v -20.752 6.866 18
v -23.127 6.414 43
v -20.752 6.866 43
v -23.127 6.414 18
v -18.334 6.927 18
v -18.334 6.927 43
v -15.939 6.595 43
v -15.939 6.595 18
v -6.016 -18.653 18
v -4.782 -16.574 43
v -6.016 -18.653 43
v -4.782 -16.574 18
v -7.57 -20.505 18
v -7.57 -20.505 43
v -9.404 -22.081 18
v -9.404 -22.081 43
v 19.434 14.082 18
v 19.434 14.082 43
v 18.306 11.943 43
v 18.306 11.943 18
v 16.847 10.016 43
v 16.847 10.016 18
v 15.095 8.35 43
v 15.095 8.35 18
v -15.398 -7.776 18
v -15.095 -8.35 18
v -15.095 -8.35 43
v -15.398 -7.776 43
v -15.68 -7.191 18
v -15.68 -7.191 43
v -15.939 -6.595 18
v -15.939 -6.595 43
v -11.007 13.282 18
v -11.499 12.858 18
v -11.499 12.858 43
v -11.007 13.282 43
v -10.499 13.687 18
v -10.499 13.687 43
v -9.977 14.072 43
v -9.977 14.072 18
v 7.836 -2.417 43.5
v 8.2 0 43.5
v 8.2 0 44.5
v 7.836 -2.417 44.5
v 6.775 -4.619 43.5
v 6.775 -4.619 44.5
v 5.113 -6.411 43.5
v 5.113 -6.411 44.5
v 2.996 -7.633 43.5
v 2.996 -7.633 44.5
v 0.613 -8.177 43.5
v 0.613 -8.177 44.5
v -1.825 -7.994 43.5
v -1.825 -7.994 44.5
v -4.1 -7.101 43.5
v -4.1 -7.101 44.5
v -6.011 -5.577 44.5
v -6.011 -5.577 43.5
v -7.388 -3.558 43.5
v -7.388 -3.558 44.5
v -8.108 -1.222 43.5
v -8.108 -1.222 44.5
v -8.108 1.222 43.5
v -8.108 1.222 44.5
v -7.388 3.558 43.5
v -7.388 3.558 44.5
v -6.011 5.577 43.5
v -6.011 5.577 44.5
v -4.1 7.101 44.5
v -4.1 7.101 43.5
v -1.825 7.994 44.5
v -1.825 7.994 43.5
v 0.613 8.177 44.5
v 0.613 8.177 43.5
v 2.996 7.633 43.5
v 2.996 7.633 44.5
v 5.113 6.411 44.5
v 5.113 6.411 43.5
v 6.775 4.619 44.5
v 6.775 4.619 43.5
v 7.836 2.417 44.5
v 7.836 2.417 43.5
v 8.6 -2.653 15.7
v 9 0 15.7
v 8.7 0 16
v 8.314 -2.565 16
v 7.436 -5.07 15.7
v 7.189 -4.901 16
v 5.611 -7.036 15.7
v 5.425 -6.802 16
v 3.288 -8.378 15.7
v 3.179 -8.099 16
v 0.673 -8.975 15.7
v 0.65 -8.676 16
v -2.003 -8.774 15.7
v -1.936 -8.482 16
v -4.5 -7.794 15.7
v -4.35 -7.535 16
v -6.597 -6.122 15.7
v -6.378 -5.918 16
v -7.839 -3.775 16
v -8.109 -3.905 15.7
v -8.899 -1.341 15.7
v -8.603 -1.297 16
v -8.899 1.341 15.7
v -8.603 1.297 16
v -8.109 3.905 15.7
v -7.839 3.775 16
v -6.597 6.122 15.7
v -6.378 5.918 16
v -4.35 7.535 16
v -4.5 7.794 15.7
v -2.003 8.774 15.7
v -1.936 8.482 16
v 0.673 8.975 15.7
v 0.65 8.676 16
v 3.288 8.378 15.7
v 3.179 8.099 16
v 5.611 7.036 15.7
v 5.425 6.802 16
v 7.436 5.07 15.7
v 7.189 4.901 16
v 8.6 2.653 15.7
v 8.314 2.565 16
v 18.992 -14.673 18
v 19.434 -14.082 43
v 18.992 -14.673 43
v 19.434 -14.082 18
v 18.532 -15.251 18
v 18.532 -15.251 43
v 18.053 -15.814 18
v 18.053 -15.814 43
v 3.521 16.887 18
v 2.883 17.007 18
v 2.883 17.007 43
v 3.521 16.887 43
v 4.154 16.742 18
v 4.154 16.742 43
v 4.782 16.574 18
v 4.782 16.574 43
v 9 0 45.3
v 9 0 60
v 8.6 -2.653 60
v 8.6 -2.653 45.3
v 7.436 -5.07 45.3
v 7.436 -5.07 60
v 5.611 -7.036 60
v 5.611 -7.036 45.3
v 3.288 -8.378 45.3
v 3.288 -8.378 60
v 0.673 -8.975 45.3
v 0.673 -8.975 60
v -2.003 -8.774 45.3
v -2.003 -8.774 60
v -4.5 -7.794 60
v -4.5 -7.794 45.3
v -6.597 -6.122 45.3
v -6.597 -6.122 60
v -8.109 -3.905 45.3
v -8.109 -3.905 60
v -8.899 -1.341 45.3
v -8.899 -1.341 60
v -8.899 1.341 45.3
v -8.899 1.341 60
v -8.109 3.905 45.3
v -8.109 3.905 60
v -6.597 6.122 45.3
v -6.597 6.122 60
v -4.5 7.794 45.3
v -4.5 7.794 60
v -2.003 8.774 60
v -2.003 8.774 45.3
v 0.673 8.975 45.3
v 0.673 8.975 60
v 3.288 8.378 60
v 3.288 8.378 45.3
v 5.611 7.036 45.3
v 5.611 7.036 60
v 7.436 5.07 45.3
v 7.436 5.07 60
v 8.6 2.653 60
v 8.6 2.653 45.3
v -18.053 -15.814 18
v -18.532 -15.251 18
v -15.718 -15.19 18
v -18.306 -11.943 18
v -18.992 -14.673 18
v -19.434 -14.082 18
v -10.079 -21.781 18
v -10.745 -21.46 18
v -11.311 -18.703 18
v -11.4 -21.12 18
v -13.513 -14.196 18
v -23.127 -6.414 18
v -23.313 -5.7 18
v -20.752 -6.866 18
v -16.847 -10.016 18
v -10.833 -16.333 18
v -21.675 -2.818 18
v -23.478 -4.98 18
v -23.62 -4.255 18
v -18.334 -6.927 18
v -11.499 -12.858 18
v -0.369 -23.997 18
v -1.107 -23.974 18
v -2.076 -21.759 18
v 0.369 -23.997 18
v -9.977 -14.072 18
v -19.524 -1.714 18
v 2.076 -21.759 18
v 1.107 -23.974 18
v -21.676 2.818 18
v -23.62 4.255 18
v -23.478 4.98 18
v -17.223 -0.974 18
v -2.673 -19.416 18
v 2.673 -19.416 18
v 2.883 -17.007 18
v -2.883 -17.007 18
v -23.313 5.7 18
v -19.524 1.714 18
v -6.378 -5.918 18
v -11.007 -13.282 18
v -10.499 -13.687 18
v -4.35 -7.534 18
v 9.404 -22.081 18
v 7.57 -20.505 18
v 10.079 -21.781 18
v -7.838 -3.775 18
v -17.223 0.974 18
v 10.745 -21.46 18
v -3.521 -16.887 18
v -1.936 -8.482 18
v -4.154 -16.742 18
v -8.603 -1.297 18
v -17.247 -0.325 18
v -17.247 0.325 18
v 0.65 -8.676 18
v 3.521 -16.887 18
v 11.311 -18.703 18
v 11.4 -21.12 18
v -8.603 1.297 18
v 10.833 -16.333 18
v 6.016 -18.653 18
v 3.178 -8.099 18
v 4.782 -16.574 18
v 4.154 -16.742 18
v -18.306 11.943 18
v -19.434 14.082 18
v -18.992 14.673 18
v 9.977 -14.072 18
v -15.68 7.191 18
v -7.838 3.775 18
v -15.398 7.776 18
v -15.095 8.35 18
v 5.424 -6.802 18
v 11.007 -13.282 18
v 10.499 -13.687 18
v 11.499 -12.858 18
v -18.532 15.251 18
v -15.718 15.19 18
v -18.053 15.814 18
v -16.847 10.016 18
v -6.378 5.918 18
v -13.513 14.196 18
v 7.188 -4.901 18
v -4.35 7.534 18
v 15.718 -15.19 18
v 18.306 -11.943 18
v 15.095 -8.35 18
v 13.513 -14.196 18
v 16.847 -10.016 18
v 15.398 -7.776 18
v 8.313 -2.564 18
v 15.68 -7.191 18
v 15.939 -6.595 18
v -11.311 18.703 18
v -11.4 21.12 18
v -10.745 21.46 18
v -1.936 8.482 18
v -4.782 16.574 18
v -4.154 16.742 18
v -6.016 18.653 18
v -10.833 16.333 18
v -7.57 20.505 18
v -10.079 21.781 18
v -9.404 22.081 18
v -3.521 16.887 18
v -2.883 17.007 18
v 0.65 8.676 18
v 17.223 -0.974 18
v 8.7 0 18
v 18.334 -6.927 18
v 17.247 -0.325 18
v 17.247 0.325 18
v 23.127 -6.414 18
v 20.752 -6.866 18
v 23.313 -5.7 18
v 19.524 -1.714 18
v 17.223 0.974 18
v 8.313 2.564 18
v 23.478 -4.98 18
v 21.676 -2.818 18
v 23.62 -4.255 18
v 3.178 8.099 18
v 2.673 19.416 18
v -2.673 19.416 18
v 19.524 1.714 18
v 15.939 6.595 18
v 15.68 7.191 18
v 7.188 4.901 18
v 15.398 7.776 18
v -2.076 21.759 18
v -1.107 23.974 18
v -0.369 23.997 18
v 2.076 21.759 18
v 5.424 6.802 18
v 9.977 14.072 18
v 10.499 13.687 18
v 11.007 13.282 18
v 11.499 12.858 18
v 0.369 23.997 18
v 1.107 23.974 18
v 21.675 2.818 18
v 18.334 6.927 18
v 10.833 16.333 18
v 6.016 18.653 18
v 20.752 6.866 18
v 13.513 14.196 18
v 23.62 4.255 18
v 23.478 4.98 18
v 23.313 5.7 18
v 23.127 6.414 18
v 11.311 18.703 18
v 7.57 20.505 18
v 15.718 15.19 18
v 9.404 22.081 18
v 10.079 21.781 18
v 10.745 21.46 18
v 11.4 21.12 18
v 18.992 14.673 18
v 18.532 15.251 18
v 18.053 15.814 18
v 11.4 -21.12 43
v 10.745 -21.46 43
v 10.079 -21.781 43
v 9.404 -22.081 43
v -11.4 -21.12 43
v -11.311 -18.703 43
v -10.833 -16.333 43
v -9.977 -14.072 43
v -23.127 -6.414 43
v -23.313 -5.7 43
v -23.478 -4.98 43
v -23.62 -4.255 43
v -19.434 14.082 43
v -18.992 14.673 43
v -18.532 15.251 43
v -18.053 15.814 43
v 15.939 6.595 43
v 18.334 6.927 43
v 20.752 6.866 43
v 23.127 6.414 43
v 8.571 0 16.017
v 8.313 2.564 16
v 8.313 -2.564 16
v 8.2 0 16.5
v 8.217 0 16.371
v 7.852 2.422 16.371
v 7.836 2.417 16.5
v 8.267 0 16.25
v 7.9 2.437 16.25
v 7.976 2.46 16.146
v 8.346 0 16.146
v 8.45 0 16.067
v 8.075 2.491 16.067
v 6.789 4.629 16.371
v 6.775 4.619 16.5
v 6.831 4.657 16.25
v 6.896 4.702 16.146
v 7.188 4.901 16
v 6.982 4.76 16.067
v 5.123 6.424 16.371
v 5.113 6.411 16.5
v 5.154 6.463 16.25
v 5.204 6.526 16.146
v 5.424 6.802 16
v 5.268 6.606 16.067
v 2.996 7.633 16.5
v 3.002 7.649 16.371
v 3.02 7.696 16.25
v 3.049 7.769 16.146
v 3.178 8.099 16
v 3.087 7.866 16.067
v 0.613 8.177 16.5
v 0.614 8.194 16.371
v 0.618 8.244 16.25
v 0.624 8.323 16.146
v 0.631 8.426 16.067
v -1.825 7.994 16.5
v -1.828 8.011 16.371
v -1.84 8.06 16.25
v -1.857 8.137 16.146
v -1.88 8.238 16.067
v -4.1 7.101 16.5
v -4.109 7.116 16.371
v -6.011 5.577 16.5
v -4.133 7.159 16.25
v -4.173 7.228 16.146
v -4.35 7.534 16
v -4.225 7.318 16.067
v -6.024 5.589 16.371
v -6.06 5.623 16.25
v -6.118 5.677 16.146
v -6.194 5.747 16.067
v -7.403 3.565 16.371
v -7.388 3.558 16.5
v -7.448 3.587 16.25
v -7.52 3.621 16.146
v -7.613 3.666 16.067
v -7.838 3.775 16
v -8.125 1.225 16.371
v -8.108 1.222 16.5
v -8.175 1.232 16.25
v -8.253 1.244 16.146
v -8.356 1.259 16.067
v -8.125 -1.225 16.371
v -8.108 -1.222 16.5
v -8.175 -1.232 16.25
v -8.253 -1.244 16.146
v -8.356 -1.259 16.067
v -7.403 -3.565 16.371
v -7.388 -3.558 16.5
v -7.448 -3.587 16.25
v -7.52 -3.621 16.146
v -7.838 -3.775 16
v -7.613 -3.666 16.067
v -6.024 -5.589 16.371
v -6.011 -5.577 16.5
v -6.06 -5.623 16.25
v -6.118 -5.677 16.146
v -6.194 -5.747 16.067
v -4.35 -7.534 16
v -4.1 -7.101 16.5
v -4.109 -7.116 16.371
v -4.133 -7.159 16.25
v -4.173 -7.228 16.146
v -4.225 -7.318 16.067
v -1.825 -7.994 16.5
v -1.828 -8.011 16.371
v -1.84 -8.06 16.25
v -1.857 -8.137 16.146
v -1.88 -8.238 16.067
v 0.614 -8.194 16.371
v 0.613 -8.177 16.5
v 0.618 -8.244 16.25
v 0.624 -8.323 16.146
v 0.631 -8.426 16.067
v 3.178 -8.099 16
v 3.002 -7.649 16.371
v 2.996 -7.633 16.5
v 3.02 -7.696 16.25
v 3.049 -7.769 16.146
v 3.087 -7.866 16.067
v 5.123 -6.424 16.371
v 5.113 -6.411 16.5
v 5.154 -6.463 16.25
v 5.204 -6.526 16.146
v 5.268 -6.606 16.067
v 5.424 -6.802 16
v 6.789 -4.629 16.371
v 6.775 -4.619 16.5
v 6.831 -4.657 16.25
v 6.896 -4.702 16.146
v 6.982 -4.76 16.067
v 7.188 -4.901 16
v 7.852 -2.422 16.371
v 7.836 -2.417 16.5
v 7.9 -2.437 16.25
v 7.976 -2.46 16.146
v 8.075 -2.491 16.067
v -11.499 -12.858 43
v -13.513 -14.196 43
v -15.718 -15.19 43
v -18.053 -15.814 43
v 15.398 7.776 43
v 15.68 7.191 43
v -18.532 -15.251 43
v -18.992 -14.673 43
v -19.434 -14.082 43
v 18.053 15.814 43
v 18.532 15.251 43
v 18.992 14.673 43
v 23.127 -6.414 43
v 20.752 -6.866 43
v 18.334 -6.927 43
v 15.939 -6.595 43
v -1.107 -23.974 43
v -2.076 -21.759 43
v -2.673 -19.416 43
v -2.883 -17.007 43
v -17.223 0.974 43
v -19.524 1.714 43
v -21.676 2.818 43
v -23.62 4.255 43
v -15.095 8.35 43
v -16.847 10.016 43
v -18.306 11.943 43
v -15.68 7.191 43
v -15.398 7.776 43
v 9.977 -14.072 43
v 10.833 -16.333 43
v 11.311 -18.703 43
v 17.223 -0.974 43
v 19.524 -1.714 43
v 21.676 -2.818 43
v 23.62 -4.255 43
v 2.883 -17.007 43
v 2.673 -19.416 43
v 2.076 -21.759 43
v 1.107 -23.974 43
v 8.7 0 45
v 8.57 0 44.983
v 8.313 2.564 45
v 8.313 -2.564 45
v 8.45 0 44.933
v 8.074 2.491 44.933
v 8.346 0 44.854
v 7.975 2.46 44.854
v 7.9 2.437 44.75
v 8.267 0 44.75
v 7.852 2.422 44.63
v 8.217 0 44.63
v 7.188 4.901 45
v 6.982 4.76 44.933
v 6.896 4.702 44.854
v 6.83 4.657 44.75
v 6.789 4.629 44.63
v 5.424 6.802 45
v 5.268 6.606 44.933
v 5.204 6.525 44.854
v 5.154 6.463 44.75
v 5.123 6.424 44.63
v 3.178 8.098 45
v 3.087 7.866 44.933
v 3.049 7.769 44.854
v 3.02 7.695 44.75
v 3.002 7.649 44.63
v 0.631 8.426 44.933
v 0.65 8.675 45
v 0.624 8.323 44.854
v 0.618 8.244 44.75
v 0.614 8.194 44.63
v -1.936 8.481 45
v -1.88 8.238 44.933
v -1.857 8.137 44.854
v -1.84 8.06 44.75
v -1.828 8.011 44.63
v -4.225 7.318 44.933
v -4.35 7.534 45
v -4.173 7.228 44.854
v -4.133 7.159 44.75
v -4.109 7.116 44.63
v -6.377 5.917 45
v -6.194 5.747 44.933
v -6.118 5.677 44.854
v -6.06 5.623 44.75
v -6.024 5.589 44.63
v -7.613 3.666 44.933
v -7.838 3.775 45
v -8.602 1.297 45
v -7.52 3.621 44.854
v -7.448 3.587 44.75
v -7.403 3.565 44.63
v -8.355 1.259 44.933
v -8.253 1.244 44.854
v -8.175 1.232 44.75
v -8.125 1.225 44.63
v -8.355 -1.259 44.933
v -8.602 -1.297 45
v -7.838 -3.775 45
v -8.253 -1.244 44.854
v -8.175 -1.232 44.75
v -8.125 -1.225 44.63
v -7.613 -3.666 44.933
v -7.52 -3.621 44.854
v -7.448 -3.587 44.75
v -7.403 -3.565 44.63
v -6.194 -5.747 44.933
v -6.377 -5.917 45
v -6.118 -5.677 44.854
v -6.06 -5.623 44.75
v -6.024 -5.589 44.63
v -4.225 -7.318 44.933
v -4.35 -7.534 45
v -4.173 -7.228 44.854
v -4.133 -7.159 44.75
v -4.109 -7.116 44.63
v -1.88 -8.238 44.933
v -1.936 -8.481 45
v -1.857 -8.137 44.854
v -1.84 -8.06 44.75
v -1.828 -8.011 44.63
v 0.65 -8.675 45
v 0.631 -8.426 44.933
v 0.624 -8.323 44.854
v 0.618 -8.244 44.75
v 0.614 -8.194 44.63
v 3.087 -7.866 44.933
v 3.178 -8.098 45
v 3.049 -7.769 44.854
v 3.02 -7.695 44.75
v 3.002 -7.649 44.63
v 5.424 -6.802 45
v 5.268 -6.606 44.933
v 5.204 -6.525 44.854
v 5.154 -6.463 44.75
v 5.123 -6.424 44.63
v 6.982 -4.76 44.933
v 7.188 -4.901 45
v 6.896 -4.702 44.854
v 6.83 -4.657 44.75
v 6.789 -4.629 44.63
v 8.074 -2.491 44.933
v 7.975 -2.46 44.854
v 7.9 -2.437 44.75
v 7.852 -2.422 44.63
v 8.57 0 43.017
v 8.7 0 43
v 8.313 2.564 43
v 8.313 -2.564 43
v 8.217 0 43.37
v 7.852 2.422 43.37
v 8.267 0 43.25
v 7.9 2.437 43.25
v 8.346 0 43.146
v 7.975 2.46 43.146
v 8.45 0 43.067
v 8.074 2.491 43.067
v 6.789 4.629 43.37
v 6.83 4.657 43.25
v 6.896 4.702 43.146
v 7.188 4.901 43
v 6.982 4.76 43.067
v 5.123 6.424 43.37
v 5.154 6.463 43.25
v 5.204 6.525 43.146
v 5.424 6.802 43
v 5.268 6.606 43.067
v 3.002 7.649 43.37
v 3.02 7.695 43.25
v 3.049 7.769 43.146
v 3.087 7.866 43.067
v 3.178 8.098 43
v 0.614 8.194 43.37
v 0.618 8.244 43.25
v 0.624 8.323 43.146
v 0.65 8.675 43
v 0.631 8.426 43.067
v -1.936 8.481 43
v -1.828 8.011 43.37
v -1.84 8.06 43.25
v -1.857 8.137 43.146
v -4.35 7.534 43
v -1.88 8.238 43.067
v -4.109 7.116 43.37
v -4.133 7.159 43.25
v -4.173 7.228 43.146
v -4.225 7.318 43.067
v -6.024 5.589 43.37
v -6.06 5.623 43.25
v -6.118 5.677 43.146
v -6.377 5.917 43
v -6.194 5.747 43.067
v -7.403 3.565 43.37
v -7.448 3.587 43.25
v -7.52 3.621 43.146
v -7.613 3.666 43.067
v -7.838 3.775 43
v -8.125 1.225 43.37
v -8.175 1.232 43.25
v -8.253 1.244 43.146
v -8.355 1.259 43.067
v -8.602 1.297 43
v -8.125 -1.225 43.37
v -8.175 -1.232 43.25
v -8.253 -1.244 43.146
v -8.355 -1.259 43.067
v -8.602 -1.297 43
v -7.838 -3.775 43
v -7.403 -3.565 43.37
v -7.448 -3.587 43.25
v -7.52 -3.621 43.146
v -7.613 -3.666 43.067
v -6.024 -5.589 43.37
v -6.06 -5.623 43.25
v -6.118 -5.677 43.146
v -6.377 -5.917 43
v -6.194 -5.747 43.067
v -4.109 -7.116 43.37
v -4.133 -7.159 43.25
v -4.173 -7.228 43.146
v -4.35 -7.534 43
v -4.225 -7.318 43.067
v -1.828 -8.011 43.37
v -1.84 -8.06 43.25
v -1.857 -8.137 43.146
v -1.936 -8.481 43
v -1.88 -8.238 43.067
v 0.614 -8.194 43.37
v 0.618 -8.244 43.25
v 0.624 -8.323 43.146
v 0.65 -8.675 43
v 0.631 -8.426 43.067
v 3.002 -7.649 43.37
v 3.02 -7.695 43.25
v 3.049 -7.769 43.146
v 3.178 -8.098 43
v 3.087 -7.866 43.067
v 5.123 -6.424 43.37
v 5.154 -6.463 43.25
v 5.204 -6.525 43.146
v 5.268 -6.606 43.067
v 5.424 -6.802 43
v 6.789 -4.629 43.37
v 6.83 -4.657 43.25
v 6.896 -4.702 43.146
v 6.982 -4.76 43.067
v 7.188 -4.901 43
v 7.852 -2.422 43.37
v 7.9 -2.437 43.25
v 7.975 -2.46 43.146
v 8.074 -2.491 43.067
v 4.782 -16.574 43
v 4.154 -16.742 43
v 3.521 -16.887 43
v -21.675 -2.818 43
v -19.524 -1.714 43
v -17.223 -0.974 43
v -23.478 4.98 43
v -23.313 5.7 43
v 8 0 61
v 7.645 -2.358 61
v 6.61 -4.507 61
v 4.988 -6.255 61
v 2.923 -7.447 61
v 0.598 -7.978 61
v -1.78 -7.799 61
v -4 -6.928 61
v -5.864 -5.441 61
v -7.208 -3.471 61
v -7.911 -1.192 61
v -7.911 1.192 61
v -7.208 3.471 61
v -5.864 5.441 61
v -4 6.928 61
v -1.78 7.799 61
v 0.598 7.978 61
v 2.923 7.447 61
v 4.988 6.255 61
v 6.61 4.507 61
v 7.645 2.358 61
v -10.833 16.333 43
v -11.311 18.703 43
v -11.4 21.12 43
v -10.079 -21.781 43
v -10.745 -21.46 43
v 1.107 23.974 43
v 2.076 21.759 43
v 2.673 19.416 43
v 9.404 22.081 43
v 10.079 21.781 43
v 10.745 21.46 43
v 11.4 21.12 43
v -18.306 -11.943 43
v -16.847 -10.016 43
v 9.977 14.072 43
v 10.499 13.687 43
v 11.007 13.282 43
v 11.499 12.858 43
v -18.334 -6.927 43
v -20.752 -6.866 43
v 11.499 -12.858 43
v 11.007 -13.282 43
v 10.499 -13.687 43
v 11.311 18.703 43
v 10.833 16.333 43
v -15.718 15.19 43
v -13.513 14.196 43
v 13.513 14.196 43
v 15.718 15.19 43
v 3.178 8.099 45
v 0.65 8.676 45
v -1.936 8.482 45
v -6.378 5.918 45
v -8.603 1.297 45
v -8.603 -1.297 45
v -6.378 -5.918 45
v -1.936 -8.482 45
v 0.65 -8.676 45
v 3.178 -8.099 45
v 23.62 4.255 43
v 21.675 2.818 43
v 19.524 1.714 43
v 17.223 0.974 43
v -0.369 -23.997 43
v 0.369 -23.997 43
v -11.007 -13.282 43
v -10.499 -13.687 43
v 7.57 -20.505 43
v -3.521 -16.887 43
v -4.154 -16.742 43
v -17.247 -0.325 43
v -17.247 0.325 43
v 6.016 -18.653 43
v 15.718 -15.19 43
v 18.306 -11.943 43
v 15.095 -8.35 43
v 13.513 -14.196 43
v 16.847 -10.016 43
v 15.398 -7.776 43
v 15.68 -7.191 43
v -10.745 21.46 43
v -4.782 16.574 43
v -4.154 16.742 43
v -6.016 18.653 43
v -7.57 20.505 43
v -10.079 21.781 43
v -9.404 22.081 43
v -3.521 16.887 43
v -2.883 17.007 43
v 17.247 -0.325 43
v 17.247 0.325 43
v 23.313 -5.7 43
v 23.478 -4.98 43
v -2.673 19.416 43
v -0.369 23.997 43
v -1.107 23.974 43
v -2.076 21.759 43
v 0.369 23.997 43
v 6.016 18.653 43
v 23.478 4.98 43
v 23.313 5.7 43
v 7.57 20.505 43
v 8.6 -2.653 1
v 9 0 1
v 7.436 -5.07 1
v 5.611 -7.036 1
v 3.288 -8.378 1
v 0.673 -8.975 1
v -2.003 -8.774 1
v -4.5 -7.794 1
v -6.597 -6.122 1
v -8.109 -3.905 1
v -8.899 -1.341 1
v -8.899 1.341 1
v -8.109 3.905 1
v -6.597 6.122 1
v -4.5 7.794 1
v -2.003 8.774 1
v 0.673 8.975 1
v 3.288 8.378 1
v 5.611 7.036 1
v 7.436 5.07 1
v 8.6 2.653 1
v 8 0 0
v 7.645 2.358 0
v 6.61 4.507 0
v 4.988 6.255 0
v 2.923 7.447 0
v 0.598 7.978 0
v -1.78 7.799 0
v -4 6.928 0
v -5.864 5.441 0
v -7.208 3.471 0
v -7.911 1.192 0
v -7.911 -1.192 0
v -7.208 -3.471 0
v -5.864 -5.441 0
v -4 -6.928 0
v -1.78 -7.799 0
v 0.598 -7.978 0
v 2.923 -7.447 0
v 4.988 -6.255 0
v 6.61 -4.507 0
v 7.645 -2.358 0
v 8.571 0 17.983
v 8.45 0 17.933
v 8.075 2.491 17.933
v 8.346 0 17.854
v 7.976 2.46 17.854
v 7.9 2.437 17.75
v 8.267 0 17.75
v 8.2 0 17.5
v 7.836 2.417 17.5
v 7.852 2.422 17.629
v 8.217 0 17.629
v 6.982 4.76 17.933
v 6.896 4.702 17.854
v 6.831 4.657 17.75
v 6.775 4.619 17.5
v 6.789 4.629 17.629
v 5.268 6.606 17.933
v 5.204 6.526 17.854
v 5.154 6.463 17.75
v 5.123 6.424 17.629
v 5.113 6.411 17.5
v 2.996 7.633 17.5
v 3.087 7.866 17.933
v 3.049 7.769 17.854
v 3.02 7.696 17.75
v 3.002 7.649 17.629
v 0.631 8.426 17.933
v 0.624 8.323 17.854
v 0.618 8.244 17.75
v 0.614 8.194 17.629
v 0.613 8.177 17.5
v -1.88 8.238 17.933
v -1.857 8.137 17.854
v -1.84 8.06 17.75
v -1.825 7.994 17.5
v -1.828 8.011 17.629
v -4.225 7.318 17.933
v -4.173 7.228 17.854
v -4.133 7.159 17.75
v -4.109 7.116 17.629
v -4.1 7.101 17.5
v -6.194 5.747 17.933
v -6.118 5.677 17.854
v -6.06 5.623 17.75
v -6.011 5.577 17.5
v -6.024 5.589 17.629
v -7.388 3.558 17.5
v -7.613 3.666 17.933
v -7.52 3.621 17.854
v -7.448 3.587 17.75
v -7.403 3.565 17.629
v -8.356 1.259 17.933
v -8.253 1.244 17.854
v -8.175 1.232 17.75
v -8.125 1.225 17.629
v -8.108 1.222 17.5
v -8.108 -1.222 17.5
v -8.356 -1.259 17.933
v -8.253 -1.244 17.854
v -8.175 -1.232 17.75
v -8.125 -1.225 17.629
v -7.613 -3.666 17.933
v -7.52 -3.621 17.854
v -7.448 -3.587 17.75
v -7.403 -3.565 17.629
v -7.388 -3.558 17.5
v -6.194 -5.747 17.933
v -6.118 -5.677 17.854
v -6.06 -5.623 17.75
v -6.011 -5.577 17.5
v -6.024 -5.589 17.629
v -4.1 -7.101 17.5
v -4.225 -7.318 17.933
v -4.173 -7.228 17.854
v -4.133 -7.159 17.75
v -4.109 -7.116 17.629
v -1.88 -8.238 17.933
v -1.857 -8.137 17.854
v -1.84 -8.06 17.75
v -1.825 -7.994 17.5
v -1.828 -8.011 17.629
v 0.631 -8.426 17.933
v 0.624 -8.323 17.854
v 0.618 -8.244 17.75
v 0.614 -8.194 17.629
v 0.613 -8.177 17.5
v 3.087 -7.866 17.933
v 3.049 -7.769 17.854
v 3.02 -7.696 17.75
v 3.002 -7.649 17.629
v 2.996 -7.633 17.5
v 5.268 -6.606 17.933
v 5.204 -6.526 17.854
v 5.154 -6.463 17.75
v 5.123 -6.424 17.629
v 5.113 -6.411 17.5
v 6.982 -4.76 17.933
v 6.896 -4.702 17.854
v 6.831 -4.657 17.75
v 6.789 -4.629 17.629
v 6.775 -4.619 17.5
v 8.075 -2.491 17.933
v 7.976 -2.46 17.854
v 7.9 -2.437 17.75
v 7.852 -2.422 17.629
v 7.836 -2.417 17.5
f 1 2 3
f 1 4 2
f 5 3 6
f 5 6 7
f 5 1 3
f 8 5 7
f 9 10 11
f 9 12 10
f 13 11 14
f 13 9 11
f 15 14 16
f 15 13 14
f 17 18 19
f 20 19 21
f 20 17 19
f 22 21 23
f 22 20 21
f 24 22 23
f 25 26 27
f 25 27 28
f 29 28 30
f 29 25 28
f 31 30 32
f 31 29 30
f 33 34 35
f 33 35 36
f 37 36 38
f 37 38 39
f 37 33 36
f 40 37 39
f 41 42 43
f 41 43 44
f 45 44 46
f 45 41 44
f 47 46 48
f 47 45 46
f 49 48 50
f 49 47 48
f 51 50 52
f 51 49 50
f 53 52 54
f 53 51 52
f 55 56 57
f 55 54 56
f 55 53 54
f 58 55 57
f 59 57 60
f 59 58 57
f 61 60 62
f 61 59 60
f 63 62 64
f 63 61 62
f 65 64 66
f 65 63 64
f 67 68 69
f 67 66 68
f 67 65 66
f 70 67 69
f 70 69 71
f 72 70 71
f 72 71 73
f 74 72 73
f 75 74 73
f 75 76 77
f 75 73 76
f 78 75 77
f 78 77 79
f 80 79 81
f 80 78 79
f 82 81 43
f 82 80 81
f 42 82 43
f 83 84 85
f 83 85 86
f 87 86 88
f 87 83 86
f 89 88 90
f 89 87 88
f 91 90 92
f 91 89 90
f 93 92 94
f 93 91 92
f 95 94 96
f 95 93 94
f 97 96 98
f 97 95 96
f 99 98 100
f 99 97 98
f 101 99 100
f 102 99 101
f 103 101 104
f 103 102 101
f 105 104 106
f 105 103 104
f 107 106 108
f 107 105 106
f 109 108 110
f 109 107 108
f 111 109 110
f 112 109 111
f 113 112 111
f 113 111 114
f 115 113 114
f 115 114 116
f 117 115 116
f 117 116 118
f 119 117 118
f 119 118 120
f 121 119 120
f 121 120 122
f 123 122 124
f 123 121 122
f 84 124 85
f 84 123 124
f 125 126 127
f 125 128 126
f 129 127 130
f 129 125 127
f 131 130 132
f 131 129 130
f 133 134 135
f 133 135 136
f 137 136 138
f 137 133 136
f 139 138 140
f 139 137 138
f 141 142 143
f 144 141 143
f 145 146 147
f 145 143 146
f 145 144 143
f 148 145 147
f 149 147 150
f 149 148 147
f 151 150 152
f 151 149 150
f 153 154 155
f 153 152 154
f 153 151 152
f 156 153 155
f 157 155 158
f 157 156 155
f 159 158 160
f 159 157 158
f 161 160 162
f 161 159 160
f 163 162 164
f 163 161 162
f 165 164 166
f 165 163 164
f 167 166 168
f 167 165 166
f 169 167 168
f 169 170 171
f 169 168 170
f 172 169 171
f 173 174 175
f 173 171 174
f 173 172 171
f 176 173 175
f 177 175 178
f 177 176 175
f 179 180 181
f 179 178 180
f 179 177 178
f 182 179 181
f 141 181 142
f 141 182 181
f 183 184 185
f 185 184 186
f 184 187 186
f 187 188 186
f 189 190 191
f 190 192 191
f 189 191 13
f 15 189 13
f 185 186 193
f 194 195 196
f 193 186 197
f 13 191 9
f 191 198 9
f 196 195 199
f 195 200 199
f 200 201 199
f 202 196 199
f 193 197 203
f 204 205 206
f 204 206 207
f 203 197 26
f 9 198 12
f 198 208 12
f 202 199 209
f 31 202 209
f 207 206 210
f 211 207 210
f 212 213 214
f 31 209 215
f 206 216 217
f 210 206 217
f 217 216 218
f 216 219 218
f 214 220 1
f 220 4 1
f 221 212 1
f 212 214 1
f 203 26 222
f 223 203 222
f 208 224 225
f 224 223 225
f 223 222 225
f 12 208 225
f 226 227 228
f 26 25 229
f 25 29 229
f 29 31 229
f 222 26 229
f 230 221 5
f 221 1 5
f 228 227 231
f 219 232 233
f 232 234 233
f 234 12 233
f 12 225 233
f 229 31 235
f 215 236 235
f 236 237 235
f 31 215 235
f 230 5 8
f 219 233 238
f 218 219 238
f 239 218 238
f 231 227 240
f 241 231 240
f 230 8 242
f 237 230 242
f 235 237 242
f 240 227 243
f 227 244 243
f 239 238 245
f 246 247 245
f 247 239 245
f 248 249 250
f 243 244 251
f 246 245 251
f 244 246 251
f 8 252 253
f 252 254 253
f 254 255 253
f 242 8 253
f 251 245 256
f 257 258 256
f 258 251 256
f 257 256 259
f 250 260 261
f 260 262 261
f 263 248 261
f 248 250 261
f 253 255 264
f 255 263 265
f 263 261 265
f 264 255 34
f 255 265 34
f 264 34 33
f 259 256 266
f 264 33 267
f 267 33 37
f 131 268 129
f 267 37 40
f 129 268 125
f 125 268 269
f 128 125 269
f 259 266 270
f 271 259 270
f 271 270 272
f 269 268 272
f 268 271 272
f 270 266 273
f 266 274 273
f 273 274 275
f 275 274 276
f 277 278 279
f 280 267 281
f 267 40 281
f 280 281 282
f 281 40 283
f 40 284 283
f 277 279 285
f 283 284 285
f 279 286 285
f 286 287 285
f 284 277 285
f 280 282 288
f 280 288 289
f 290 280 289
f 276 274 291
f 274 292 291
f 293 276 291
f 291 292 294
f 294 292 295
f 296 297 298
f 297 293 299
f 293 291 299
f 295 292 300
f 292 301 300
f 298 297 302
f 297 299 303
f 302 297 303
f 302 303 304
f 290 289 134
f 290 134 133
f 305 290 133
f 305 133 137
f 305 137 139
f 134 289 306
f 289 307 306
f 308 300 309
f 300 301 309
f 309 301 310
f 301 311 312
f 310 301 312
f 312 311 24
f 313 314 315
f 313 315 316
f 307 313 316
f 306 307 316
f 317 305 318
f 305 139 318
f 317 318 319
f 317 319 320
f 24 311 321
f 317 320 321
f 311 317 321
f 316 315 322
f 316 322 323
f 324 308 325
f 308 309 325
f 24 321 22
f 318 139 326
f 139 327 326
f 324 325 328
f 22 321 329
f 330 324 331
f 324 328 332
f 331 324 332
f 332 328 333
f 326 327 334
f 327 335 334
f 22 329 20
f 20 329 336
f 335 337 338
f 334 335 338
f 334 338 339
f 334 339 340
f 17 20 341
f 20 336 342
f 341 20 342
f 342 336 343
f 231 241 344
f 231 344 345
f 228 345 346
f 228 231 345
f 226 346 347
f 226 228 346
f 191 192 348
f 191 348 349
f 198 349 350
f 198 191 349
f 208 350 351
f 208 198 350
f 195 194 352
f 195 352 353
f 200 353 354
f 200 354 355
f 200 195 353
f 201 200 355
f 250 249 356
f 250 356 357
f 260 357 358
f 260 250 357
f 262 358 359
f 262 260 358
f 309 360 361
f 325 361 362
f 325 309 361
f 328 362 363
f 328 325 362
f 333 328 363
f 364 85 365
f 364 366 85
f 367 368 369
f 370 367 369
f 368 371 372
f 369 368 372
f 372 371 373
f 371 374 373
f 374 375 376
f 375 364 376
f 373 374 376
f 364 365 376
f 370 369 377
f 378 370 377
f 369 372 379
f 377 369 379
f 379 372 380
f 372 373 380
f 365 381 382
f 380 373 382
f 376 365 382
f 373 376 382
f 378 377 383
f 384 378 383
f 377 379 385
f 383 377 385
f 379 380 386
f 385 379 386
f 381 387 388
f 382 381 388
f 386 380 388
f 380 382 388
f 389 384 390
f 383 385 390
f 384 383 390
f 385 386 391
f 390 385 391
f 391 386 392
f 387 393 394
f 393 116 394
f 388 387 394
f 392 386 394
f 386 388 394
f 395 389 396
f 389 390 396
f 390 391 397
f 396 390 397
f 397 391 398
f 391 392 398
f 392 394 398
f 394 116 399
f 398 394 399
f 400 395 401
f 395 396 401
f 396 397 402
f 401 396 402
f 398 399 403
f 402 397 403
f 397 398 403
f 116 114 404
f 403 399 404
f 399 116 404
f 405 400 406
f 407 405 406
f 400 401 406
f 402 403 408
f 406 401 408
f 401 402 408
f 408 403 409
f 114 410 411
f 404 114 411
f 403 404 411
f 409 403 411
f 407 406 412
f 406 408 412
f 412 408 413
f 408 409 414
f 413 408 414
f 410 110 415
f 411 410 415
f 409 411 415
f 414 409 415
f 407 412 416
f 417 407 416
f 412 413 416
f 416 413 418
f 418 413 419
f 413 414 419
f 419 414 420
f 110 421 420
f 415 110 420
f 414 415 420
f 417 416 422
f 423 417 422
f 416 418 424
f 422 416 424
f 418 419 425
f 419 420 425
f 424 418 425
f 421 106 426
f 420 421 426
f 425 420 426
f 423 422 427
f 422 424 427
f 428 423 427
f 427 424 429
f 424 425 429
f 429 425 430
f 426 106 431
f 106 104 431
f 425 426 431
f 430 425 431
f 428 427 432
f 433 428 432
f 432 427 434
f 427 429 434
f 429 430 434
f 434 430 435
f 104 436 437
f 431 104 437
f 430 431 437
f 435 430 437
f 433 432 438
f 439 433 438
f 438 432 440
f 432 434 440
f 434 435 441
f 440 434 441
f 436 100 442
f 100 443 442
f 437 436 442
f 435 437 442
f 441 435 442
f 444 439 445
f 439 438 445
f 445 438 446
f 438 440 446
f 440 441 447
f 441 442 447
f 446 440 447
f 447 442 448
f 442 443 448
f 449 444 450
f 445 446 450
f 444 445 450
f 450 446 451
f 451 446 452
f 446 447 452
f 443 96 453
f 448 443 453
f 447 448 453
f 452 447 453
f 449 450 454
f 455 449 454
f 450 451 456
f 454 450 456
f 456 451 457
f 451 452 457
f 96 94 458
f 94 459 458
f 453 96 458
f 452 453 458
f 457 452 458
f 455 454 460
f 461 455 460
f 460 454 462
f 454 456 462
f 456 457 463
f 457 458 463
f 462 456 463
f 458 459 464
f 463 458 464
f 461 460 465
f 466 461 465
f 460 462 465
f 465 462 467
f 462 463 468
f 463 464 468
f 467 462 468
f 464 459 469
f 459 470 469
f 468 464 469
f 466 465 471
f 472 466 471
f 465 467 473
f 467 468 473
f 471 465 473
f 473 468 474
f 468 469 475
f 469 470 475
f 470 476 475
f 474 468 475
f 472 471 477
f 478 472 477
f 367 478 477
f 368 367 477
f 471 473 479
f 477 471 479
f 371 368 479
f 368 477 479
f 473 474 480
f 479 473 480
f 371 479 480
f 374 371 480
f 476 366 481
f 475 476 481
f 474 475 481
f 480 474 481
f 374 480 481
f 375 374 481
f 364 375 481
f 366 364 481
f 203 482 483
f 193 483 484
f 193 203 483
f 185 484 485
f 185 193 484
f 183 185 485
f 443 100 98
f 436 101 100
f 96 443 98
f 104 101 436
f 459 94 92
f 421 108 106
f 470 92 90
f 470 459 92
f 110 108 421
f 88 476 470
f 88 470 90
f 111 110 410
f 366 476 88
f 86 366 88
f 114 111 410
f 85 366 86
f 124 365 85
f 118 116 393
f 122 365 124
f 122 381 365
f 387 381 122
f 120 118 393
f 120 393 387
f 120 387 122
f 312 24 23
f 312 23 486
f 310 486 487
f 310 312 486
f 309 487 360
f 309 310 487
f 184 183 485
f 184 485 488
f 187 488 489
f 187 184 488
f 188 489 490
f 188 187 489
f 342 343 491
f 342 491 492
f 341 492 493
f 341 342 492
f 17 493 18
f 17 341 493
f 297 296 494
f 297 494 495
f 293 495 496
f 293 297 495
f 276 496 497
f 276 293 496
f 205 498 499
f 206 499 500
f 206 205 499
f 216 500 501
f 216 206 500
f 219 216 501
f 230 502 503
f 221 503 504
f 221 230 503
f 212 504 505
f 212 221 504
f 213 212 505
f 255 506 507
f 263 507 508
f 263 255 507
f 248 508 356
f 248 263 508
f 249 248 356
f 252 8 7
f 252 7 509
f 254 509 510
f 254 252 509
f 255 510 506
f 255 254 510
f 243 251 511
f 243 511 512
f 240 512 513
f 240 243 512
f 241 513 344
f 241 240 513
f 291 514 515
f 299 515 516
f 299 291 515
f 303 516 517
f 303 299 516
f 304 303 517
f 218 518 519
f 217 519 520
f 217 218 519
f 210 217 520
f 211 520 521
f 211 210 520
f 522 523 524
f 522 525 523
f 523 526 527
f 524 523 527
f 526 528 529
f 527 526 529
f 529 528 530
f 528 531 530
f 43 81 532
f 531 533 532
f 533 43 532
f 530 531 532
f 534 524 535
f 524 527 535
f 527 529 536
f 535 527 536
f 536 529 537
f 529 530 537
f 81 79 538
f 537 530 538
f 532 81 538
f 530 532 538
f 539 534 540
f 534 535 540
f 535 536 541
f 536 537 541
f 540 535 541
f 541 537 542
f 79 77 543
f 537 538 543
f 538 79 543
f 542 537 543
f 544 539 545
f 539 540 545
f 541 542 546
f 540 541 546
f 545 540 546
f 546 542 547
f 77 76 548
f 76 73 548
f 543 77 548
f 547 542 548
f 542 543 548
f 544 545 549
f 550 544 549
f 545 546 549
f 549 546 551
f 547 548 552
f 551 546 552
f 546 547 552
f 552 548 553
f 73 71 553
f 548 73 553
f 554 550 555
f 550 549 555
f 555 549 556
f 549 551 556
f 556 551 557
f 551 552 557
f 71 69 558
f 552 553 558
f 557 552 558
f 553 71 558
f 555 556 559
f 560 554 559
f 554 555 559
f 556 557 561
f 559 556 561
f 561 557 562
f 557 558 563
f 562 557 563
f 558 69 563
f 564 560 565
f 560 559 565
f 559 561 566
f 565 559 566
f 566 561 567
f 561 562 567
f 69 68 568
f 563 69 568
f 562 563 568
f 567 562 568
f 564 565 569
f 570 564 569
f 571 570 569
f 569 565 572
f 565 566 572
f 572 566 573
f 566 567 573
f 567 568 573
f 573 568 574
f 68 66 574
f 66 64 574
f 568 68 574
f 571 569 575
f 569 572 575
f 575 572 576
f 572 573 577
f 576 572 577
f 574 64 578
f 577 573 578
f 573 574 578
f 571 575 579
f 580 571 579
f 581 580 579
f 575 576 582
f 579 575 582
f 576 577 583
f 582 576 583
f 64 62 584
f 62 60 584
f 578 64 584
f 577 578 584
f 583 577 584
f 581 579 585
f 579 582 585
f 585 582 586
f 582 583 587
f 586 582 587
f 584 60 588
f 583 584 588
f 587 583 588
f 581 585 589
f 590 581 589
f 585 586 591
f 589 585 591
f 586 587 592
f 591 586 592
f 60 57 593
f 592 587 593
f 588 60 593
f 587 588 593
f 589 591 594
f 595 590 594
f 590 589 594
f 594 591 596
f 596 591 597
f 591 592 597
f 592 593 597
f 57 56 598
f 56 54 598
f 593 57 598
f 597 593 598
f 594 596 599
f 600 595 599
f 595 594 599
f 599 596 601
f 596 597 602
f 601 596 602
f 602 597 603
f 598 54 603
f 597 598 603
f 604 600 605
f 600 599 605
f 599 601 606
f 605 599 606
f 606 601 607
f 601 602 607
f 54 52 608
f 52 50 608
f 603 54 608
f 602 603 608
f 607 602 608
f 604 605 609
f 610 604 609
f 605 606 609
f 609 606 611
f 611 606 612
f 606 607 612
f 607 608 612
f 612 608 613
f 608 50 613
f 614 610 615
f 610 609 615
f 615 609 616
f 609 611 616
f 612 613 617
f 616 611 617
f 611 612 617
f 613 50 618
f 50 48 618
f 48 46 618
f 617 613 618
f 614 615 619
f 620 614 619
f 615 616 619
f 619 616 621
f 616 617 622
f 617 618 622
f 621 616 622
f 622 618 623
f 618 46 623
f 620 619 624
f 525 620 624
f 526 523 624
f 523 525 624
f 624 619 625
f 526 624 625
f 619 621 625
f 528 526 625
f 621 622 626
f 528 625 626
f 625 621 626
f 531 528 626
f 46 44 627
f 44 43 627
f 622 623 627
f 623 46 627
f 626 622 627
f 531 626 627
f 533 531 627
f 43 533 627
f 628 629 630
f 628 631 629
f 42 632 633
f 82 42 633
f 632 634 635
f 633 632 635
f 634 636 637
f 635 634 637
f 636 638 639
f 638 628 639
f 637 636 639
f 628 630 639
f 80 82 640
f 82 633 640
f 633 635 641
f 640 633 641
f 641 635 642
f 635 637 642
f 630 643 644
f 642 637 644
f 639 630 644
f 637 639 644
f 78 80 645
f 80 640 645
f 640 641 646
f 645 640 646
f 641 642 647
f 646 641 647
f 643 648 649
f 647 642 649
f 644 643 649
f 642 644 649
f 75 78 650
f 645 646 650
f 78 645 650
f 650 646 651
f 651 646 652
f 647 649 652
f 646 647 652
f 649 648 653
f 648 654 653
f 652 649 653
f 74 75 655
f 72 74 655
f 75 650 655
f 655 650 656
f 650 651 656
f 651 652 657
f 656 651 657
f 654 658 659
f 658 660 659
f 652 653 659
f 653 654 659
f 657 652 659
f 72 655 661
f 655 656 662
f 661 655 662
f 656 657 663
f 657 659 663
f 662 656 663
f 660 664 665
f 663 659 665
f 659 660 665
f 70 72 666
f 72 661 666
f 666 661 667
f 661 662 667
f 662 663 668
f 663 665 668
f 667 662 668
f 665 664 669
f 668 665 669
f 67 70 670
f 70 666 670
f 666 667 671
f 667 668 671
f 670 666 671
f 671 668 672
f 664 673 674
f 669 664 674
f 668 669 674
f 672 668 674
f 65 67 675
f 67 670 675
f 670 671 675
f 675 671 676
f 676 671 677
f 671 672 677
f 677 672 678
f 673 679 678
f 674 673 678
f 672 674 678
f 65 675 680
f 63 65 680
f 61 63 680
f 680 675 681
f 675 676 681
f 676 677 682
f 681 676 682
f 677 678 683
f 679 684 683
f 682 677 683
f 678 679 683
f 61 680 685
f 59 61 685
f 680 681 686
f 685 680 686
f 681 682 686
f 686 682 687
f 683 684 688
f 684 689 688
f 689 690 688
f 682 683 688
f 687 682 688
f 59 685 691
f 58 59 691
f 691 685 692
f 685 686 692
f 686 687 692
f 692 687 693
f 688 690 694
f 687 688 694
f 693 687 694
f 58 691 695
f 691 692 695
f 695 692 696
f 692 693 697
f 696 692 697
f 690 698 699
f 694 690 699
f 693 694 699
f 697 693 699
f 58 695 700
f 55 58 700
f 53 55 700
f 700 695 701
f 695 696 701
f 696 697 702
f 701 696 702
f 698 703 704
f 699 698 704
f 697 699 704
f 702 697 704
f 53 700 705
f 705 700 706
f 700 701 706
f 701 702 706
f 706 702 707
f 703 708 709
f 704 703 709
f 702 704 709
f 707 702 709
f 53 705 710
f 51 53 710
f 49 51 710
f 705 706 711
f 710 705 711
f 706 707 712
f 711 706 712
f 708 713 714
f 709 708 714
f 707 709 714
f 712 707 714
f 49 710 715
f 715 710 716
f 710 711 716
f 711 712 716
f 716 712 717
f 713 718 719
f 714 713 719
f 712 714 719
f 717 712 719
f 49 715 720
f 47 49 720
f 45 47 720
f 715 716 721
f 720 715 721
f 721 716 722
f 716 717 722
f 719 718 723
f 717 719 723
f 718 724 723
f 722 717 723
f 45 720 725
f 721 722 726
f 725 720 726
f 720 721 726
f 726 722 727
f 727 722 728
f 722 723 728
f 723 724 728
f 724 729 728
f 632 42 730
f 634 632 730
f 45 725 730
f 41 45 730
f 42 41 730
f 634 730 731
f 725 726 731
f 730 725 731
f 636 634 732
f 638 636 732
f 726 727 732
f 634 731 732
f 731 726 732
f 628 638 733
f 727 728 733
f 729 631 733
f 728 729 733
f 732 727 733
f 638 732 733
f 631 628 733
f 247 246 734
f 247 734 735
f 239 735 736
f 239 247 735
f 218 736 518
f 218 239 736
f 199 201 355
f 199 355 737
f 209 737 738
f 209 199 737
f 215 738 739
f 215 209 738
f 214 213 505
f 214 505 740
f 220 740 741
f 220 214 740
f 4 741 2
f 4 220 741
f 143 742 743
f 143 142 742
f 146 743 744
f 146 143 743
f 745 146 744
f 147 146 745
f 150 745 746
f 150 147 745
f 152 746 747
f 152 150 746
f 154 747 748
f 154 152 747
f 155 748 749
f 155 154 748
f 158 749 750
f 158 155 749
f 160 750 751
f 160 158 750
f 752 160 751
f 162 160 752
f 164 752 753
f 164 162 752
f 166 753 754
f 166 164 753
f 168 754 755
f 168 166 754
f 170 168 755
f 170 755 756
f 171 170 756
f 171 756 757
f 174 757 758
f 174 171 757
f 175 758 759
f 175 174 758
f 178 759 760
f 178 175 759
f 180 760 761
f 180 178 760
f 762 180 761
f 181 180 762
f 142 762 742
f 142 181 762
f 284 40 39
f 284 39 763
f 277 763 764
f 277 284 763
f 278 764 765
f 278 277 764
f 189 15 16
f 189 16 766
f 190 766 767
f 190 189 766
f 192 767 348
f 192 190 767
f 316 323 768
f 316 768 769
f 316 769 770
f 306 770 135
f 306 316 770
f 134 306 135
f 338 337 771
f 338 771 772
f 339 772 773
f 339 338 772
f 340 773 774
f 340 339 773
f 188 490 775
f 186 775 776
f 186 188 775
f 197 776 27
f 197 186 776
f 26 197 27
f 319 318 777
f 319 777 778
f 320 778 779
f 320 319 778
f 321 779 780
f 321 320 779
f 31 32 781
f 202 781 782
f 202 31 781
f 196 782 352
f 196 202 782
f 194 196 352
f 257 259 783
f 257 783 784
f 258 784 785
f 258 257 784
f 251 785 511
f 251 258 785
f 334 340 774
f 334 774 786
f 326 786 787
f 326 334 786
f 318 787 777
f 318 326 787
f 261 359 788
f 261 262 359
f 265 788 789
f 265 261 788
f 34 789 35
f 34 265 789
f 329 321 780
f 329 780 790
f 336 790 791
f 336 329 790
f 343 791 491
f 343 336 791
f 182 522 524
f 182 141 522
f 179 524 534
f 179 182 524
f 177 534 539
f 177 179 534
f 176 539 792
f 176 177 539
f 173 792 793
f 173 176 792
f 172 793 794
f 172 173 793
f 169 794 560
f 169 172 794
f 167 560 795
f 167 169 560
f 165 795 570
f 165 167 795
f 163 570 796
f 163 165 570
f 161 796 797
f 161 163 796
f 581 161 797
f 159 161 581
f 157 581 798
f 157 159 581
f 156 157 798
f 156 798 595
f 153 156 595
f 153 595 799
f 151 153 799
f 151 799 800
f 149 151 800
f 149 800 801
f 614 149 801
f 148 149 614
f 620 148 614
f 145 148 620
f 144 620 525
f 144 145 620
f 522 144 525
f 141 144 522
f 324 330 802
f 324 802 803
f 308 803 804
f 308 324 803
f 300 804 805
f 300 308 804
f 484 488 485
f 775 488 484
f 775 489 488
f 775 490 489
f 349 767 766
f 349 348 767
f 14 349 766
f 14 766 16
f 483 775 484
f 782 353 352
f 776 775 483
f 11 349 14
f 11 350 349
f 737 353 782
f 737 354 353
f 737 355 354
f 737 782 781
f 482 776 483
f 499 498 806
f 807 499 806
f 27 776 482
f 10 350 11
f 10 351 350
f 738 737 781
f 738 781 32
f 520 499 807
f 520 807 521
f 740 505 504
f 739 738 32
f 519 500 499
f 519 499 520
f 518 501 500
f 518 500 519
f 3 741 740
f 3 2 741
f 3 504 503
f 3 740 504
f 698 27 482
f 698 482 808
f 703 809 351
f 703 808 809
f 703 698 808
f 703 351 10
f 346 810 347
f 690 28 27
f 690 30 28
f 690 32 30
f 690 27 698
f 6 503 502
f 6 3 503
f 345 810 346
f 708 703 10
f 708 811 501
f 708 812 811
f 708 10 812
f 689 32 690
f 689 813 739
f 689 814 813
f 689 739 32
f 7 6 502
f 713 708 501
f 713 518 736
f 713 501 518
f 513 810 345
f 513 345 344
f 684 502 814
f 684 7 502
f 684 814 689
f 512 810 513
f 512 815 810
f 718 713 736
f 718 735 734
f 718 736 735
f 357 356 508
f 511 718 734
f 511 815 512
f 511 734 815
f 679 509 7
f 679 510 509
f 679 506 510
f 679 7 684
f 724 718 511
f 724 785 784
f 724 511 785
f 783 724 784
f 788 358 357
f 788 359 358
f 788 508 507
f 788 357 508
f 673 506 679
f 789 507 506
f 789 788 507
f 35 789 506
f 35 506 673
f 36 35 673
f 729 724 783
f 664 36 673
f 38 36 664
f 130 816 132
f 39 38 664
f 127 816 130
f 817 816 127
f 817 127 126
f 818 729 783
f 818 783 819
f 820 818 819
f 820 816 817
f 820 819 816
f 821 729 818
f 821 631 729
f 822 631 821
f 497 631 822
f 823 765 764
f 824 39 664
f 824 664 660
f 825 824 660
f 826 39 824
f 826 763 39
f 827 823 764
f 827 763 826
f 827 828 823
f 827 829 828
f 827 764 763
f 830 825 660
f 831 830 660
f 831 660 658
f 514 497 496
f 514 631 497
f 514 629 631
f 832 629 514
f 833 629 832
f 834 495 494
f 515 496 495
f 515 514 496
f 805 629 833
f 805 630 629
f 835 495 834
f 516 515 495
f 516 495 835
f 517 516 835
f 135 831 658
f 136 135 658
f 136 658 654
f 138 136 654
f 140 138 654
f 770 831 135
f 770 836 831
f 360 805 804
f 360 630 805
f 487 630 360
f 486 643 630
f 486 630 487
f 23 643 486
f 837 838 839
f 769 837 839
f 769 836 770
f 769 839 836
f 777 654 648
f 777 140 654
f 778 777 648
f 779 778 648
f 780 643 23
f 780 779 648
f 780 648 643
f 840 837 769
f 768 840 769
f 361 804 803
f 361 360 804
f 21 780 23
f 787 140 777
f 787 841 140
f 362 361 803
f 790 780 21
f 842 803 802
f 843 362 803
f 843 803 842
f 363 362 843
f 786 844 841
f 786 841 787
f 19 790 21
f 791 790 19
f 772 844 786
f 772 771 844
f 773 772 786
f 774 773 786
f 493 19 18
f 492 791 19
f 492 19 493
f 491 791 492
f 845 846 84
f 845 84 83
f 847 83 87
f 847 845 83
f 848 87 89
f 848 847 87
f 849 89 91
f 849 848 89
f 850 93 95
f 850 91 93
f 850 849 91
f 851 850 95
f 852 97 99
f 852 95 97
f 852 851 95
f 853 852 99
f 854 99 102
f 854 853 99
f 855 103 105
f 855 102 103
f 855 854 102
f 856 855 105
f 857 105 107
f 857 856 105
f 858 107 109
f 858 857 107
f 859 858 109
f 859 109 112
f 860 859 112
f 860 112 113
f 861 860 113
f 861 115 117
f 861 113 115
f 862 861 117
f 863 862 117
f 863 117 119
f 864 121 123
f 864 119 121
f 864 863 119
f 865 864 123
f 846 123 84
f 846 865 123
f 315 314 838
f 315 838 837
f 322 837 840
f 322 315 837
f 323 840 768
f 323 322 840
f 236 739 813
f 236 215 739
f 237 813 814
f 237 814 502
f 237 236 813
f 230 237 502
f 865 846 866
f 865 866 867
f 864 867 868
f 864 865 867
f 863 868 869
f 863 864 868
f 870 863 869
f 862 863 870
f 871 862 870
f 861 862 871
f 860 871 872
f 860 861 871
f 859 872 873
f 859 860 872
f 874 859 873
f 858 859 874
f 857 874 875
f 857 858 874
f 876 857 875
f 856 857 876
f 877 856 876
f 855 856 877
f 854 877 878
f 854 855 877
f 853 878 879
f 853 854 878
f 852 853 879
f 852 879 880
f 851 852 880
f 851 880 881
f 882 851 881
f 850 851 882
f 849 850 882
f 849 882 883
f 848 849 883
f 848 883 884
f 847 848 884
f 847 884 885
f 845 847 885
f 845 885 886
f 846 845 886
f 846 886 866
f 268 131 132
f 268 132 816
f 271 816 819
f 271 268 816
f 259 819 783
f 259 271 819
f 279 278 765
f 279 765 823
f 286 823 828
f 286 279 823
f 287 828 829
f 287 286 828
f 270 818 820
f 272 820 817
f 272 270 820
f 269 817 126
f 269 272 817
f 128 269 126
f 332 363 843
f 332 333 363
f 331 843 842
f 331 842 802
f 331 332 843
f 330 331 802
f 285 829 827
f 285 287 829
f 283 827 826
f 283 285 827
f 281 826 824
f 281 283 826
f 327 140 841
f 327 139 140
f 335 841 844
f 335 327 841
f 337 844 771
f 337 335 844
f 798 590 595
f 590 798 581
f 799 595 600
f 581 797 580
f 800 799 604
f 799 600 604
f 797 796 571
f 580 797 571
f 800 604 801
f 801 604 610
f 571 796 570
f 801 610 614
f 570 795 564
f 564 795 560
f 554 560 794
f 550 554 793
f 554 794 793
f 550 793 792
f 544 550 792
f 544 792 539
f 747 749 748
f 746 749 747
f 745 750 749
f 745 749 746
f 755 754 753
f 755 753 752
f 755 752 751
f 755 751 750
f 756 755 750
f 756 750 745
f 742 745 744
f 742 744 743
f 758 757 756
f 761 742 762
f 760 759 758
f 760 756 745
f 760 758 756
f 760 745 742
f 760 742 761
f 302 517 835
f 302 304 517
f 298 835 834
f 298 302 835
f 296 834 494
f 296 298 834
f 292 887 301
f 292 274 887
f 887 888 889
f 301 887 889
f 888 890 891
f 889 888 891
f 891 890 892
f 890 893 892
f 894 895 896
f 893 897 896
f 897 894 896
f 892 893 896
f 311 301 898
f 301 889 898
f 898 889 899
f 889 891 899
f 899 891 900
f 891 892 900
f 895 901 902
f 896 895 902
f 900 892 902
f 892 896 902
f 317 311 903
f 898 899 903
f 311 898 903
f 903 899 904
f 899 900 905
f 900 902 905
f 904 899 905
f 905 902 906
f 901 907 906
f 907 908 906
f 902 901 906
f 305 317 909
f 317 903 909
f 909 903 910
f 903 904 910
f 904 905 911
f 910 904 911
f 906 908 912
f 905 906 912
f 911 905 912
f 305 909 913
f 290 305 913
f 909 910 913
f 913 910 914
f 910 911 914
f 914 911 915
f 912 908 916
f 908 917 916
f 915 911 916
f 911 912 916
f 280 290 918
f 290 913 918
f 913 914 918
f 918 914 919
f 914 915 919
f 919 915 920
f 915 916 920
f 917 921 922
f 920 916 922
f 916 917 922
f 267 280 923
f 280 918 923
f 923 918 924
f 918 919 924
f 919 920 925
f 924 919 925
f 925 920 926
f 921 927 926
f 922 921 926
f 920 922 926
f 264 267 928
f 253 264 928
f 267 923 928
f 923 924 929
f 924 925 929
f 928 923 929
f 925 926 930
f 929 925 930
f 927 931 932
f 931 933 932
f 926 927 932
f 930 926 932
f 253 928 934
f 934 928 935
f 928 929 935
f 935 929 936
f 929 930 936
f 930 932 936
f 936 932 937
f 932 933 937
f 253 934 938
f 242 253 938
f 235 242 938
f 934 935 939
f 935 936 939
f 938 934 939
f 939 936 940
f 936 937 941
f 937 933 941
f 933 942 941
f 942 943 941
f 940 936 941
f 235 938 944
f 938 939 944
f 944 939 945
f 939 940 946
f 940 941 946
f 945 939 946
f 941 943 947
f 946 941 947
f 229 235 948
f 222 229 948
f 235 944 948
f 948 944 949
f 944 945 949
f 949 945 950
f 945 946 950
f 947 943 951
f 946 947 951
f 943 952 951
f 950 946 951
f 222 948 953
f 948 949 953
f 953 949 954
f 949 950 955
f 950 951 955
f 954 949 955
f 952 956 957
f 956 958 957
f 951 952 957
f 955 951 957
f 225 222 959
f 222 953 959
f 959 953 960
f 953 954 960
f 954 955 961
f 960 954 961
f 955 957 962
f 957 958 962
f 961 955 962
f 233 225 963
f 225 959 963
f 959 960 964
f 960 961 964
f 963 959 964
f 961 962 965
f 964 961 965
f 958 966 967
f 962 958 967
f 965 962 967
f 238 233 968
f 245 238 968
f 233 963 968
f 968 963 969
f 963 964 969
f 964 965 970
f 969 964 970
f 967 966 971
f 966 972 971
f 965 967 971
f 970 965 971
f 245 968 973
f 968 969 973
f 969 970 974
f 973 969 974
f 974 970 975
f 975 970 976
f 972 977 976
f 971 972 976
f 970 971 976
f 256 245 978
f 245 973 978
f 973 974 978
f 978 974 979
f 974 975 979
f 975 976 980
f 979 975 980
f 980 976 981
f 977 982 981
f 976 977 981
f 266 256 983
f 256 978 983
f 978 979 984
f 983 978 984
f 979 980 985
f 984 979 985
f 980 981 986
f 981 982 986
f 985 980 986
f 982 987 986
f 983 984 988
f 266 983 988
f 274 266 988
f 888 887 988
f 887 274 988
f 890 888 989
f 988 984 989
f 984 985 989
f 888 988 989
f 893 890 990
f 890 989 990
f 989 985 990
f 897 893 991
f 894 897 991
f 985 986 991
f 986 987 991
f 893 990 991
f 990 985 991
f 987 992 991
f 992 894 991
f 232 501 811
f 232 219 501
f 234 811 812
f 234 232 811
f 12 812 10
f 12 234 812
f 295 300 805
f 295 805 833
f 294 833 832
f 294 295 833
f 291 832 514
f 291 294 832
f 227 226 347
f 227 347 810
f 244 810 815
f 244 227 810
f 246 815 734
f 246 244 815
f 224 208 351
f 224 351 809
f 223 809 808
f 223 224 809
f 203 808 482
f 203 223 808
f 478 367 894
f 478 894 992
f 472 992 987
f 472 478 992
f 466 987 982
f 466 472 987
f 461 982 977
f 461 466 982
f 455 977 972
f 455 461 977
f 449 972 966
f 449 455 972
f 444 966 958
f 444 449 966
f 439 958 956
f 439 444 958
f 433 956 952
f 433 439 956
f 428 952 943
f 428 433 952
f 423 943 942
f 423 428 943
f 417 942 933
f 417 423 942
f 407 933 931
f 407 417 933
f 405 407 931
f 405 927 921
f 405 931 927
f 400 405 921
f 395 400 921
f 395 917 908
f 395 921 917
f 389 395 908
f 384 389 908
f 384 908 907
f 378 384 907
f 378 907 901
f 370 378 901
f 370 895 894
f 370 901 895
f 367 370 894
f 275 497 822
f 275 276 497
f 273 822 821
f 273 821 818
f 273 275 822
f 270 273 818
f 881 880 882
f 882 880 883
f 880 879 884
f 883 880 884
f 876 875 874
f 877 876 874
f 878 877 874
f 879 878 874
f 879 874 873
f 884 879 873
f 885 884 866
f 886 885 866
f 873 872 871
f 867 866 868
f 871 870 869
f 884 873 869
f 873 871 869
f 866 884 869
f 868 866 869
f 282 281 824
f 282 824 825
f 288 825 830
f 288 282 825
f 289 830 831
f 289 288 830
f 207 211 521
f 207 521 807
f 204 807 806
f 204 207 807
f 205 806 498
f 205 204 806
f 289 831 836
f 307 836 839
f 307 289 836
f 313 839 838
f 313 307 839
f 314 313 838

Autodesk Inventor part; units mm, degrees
ref_plane "YZ Plane" through (0, 0, 0) normal (1, 0, 0) x (0, 1, 0)
ref_plane "XY Plane" through (0, 0, 0) normal (0, 0, 1) x (1, 0, 0)
sketch "草图1" plane through (0, 0, 0) normal (0, 0, 1) x (1, 0, 0)
  circle A0 centre (0, 0) radius 9
  dimension "d0" = 18
extrude "拉伸1" add sketch "草图1" along normal blind 16
sketch "草图2" plane through (0, 0, 16) normal (0, 0, 1) x (1, 0, 0)
  circle A0 centre (0, 0) radius 9 projected
  circle A1 centre (0, 0) radius 8.2
  dimension "d3" = 16.4
extrude "拉伸2" add sketch "草图2" along normal blind 2 contours A1
sketch "草图3" plane through (0, 0, 18) normal (0, 0, 1) x (1, 0, 0)
  circle A0 centre (0, 0) radius 8.2 projected
  circle A1 centre (0, 0) radius 17.25
  dimension "d6" = 34.5
extrude "拉伸3" add sketch "草图3" along normal blind 25 contours A0 | A1
sketch "草图4" plane through (0, 0, 43) normal (0, 0, 1) x (1, 0, 0)
  circle A0 centre (0, 0) radius 8.2 projected
  circle A1 centre (0, 0) radius 8.2
extrude "拉伸4" add sketch "草图4" along normal blind 2
sketch "草图5" plane through (0, 0, 45) normal (0, 0, 1) x (1, 0, 0)
  circle A0 centre (0, 0) radius 8.2 projected
  circle A1 centre (0, 0) radius 9
  dimension "d11" = 18
extrude "拉伸5" add sketch "草图5" along normal blind 16 contours A0 | A1
fillet "圆角2" radius 0.5 2 edges at (-8.2, 0, 16) (-8.2, 0, 18)
chamfer "倒角2" distance 0.3 angle 45 1 edges at (-9, 0, 16)
chamfer "倒角3" distance 0.3 angle 45 1 edges at (-9, 0, 45)
fillet "圆角4" radius 0.5 2 edges at (-8.2, 0, 45) (-8.2, 0, 43)
chamfer "倒角5" distance 1 angle 45 1 edges at (-9, 0, 0)
ref_plane "工作平面1" through (0, -3, 0) normal (0, 1, 0) x (-1, 0, 0)
sketch "草图13" plane through (0, 0, 18) normal (0, 0, -1) x (-1, 0, 0)
  circle A0 centre (0, 0) radius 17.25 projected
  circle A1 centre (0, 0) radius 8.7 projected
  circle A2 centre (0, 0) radius 21
  circle A3 centre (0, 0) radius 24
  circle A4 centre (0, 0) radius 17.25 projected
  arc A5 (-1.1074, 23.9744) -> (-2.8831, 17.0074) centre (11.9993, 16.9242) ccw
  line L0 (0, 0) -> (0, 27.2026) construction
  arc A6 (2.8831, 17.0074) -> (1.1074, 23.9744) centre (-11.9993, 16.9242) ccw
  arc A7 (1.1074, 23.9744) -> (-1.1074, 23.9744) centre (0, 0) ccw
  point P0 (-2.3513, 20.868)
  point P1 (2.3513, 20.868)
  point P2 (2.8831, 17.0074)
  point P3 (-2.8831, 17.0074)
  dimension "d68" = 42
  dimension "d69" = 48
  dimension "d70" = 12.857
extrude "拉伸11" add sketch "草图13" against normal up to surface (25 mm away) contours A0 A5 A2 A6 | A2 A5 A3 A6 picked at (-0.2617, 18.4771) picked at (0.1231, 21.9893)
pattern_circular "环形阵列1" count 14 over 360 about axis through (0, 0, 18) along (0, 0, 1) of "拉伸11"
chamfer "倒角6" distance 1 angle 45 1 edges at (-9, 0, 61)
properties part number "主动齿轮轴" material "钢"
